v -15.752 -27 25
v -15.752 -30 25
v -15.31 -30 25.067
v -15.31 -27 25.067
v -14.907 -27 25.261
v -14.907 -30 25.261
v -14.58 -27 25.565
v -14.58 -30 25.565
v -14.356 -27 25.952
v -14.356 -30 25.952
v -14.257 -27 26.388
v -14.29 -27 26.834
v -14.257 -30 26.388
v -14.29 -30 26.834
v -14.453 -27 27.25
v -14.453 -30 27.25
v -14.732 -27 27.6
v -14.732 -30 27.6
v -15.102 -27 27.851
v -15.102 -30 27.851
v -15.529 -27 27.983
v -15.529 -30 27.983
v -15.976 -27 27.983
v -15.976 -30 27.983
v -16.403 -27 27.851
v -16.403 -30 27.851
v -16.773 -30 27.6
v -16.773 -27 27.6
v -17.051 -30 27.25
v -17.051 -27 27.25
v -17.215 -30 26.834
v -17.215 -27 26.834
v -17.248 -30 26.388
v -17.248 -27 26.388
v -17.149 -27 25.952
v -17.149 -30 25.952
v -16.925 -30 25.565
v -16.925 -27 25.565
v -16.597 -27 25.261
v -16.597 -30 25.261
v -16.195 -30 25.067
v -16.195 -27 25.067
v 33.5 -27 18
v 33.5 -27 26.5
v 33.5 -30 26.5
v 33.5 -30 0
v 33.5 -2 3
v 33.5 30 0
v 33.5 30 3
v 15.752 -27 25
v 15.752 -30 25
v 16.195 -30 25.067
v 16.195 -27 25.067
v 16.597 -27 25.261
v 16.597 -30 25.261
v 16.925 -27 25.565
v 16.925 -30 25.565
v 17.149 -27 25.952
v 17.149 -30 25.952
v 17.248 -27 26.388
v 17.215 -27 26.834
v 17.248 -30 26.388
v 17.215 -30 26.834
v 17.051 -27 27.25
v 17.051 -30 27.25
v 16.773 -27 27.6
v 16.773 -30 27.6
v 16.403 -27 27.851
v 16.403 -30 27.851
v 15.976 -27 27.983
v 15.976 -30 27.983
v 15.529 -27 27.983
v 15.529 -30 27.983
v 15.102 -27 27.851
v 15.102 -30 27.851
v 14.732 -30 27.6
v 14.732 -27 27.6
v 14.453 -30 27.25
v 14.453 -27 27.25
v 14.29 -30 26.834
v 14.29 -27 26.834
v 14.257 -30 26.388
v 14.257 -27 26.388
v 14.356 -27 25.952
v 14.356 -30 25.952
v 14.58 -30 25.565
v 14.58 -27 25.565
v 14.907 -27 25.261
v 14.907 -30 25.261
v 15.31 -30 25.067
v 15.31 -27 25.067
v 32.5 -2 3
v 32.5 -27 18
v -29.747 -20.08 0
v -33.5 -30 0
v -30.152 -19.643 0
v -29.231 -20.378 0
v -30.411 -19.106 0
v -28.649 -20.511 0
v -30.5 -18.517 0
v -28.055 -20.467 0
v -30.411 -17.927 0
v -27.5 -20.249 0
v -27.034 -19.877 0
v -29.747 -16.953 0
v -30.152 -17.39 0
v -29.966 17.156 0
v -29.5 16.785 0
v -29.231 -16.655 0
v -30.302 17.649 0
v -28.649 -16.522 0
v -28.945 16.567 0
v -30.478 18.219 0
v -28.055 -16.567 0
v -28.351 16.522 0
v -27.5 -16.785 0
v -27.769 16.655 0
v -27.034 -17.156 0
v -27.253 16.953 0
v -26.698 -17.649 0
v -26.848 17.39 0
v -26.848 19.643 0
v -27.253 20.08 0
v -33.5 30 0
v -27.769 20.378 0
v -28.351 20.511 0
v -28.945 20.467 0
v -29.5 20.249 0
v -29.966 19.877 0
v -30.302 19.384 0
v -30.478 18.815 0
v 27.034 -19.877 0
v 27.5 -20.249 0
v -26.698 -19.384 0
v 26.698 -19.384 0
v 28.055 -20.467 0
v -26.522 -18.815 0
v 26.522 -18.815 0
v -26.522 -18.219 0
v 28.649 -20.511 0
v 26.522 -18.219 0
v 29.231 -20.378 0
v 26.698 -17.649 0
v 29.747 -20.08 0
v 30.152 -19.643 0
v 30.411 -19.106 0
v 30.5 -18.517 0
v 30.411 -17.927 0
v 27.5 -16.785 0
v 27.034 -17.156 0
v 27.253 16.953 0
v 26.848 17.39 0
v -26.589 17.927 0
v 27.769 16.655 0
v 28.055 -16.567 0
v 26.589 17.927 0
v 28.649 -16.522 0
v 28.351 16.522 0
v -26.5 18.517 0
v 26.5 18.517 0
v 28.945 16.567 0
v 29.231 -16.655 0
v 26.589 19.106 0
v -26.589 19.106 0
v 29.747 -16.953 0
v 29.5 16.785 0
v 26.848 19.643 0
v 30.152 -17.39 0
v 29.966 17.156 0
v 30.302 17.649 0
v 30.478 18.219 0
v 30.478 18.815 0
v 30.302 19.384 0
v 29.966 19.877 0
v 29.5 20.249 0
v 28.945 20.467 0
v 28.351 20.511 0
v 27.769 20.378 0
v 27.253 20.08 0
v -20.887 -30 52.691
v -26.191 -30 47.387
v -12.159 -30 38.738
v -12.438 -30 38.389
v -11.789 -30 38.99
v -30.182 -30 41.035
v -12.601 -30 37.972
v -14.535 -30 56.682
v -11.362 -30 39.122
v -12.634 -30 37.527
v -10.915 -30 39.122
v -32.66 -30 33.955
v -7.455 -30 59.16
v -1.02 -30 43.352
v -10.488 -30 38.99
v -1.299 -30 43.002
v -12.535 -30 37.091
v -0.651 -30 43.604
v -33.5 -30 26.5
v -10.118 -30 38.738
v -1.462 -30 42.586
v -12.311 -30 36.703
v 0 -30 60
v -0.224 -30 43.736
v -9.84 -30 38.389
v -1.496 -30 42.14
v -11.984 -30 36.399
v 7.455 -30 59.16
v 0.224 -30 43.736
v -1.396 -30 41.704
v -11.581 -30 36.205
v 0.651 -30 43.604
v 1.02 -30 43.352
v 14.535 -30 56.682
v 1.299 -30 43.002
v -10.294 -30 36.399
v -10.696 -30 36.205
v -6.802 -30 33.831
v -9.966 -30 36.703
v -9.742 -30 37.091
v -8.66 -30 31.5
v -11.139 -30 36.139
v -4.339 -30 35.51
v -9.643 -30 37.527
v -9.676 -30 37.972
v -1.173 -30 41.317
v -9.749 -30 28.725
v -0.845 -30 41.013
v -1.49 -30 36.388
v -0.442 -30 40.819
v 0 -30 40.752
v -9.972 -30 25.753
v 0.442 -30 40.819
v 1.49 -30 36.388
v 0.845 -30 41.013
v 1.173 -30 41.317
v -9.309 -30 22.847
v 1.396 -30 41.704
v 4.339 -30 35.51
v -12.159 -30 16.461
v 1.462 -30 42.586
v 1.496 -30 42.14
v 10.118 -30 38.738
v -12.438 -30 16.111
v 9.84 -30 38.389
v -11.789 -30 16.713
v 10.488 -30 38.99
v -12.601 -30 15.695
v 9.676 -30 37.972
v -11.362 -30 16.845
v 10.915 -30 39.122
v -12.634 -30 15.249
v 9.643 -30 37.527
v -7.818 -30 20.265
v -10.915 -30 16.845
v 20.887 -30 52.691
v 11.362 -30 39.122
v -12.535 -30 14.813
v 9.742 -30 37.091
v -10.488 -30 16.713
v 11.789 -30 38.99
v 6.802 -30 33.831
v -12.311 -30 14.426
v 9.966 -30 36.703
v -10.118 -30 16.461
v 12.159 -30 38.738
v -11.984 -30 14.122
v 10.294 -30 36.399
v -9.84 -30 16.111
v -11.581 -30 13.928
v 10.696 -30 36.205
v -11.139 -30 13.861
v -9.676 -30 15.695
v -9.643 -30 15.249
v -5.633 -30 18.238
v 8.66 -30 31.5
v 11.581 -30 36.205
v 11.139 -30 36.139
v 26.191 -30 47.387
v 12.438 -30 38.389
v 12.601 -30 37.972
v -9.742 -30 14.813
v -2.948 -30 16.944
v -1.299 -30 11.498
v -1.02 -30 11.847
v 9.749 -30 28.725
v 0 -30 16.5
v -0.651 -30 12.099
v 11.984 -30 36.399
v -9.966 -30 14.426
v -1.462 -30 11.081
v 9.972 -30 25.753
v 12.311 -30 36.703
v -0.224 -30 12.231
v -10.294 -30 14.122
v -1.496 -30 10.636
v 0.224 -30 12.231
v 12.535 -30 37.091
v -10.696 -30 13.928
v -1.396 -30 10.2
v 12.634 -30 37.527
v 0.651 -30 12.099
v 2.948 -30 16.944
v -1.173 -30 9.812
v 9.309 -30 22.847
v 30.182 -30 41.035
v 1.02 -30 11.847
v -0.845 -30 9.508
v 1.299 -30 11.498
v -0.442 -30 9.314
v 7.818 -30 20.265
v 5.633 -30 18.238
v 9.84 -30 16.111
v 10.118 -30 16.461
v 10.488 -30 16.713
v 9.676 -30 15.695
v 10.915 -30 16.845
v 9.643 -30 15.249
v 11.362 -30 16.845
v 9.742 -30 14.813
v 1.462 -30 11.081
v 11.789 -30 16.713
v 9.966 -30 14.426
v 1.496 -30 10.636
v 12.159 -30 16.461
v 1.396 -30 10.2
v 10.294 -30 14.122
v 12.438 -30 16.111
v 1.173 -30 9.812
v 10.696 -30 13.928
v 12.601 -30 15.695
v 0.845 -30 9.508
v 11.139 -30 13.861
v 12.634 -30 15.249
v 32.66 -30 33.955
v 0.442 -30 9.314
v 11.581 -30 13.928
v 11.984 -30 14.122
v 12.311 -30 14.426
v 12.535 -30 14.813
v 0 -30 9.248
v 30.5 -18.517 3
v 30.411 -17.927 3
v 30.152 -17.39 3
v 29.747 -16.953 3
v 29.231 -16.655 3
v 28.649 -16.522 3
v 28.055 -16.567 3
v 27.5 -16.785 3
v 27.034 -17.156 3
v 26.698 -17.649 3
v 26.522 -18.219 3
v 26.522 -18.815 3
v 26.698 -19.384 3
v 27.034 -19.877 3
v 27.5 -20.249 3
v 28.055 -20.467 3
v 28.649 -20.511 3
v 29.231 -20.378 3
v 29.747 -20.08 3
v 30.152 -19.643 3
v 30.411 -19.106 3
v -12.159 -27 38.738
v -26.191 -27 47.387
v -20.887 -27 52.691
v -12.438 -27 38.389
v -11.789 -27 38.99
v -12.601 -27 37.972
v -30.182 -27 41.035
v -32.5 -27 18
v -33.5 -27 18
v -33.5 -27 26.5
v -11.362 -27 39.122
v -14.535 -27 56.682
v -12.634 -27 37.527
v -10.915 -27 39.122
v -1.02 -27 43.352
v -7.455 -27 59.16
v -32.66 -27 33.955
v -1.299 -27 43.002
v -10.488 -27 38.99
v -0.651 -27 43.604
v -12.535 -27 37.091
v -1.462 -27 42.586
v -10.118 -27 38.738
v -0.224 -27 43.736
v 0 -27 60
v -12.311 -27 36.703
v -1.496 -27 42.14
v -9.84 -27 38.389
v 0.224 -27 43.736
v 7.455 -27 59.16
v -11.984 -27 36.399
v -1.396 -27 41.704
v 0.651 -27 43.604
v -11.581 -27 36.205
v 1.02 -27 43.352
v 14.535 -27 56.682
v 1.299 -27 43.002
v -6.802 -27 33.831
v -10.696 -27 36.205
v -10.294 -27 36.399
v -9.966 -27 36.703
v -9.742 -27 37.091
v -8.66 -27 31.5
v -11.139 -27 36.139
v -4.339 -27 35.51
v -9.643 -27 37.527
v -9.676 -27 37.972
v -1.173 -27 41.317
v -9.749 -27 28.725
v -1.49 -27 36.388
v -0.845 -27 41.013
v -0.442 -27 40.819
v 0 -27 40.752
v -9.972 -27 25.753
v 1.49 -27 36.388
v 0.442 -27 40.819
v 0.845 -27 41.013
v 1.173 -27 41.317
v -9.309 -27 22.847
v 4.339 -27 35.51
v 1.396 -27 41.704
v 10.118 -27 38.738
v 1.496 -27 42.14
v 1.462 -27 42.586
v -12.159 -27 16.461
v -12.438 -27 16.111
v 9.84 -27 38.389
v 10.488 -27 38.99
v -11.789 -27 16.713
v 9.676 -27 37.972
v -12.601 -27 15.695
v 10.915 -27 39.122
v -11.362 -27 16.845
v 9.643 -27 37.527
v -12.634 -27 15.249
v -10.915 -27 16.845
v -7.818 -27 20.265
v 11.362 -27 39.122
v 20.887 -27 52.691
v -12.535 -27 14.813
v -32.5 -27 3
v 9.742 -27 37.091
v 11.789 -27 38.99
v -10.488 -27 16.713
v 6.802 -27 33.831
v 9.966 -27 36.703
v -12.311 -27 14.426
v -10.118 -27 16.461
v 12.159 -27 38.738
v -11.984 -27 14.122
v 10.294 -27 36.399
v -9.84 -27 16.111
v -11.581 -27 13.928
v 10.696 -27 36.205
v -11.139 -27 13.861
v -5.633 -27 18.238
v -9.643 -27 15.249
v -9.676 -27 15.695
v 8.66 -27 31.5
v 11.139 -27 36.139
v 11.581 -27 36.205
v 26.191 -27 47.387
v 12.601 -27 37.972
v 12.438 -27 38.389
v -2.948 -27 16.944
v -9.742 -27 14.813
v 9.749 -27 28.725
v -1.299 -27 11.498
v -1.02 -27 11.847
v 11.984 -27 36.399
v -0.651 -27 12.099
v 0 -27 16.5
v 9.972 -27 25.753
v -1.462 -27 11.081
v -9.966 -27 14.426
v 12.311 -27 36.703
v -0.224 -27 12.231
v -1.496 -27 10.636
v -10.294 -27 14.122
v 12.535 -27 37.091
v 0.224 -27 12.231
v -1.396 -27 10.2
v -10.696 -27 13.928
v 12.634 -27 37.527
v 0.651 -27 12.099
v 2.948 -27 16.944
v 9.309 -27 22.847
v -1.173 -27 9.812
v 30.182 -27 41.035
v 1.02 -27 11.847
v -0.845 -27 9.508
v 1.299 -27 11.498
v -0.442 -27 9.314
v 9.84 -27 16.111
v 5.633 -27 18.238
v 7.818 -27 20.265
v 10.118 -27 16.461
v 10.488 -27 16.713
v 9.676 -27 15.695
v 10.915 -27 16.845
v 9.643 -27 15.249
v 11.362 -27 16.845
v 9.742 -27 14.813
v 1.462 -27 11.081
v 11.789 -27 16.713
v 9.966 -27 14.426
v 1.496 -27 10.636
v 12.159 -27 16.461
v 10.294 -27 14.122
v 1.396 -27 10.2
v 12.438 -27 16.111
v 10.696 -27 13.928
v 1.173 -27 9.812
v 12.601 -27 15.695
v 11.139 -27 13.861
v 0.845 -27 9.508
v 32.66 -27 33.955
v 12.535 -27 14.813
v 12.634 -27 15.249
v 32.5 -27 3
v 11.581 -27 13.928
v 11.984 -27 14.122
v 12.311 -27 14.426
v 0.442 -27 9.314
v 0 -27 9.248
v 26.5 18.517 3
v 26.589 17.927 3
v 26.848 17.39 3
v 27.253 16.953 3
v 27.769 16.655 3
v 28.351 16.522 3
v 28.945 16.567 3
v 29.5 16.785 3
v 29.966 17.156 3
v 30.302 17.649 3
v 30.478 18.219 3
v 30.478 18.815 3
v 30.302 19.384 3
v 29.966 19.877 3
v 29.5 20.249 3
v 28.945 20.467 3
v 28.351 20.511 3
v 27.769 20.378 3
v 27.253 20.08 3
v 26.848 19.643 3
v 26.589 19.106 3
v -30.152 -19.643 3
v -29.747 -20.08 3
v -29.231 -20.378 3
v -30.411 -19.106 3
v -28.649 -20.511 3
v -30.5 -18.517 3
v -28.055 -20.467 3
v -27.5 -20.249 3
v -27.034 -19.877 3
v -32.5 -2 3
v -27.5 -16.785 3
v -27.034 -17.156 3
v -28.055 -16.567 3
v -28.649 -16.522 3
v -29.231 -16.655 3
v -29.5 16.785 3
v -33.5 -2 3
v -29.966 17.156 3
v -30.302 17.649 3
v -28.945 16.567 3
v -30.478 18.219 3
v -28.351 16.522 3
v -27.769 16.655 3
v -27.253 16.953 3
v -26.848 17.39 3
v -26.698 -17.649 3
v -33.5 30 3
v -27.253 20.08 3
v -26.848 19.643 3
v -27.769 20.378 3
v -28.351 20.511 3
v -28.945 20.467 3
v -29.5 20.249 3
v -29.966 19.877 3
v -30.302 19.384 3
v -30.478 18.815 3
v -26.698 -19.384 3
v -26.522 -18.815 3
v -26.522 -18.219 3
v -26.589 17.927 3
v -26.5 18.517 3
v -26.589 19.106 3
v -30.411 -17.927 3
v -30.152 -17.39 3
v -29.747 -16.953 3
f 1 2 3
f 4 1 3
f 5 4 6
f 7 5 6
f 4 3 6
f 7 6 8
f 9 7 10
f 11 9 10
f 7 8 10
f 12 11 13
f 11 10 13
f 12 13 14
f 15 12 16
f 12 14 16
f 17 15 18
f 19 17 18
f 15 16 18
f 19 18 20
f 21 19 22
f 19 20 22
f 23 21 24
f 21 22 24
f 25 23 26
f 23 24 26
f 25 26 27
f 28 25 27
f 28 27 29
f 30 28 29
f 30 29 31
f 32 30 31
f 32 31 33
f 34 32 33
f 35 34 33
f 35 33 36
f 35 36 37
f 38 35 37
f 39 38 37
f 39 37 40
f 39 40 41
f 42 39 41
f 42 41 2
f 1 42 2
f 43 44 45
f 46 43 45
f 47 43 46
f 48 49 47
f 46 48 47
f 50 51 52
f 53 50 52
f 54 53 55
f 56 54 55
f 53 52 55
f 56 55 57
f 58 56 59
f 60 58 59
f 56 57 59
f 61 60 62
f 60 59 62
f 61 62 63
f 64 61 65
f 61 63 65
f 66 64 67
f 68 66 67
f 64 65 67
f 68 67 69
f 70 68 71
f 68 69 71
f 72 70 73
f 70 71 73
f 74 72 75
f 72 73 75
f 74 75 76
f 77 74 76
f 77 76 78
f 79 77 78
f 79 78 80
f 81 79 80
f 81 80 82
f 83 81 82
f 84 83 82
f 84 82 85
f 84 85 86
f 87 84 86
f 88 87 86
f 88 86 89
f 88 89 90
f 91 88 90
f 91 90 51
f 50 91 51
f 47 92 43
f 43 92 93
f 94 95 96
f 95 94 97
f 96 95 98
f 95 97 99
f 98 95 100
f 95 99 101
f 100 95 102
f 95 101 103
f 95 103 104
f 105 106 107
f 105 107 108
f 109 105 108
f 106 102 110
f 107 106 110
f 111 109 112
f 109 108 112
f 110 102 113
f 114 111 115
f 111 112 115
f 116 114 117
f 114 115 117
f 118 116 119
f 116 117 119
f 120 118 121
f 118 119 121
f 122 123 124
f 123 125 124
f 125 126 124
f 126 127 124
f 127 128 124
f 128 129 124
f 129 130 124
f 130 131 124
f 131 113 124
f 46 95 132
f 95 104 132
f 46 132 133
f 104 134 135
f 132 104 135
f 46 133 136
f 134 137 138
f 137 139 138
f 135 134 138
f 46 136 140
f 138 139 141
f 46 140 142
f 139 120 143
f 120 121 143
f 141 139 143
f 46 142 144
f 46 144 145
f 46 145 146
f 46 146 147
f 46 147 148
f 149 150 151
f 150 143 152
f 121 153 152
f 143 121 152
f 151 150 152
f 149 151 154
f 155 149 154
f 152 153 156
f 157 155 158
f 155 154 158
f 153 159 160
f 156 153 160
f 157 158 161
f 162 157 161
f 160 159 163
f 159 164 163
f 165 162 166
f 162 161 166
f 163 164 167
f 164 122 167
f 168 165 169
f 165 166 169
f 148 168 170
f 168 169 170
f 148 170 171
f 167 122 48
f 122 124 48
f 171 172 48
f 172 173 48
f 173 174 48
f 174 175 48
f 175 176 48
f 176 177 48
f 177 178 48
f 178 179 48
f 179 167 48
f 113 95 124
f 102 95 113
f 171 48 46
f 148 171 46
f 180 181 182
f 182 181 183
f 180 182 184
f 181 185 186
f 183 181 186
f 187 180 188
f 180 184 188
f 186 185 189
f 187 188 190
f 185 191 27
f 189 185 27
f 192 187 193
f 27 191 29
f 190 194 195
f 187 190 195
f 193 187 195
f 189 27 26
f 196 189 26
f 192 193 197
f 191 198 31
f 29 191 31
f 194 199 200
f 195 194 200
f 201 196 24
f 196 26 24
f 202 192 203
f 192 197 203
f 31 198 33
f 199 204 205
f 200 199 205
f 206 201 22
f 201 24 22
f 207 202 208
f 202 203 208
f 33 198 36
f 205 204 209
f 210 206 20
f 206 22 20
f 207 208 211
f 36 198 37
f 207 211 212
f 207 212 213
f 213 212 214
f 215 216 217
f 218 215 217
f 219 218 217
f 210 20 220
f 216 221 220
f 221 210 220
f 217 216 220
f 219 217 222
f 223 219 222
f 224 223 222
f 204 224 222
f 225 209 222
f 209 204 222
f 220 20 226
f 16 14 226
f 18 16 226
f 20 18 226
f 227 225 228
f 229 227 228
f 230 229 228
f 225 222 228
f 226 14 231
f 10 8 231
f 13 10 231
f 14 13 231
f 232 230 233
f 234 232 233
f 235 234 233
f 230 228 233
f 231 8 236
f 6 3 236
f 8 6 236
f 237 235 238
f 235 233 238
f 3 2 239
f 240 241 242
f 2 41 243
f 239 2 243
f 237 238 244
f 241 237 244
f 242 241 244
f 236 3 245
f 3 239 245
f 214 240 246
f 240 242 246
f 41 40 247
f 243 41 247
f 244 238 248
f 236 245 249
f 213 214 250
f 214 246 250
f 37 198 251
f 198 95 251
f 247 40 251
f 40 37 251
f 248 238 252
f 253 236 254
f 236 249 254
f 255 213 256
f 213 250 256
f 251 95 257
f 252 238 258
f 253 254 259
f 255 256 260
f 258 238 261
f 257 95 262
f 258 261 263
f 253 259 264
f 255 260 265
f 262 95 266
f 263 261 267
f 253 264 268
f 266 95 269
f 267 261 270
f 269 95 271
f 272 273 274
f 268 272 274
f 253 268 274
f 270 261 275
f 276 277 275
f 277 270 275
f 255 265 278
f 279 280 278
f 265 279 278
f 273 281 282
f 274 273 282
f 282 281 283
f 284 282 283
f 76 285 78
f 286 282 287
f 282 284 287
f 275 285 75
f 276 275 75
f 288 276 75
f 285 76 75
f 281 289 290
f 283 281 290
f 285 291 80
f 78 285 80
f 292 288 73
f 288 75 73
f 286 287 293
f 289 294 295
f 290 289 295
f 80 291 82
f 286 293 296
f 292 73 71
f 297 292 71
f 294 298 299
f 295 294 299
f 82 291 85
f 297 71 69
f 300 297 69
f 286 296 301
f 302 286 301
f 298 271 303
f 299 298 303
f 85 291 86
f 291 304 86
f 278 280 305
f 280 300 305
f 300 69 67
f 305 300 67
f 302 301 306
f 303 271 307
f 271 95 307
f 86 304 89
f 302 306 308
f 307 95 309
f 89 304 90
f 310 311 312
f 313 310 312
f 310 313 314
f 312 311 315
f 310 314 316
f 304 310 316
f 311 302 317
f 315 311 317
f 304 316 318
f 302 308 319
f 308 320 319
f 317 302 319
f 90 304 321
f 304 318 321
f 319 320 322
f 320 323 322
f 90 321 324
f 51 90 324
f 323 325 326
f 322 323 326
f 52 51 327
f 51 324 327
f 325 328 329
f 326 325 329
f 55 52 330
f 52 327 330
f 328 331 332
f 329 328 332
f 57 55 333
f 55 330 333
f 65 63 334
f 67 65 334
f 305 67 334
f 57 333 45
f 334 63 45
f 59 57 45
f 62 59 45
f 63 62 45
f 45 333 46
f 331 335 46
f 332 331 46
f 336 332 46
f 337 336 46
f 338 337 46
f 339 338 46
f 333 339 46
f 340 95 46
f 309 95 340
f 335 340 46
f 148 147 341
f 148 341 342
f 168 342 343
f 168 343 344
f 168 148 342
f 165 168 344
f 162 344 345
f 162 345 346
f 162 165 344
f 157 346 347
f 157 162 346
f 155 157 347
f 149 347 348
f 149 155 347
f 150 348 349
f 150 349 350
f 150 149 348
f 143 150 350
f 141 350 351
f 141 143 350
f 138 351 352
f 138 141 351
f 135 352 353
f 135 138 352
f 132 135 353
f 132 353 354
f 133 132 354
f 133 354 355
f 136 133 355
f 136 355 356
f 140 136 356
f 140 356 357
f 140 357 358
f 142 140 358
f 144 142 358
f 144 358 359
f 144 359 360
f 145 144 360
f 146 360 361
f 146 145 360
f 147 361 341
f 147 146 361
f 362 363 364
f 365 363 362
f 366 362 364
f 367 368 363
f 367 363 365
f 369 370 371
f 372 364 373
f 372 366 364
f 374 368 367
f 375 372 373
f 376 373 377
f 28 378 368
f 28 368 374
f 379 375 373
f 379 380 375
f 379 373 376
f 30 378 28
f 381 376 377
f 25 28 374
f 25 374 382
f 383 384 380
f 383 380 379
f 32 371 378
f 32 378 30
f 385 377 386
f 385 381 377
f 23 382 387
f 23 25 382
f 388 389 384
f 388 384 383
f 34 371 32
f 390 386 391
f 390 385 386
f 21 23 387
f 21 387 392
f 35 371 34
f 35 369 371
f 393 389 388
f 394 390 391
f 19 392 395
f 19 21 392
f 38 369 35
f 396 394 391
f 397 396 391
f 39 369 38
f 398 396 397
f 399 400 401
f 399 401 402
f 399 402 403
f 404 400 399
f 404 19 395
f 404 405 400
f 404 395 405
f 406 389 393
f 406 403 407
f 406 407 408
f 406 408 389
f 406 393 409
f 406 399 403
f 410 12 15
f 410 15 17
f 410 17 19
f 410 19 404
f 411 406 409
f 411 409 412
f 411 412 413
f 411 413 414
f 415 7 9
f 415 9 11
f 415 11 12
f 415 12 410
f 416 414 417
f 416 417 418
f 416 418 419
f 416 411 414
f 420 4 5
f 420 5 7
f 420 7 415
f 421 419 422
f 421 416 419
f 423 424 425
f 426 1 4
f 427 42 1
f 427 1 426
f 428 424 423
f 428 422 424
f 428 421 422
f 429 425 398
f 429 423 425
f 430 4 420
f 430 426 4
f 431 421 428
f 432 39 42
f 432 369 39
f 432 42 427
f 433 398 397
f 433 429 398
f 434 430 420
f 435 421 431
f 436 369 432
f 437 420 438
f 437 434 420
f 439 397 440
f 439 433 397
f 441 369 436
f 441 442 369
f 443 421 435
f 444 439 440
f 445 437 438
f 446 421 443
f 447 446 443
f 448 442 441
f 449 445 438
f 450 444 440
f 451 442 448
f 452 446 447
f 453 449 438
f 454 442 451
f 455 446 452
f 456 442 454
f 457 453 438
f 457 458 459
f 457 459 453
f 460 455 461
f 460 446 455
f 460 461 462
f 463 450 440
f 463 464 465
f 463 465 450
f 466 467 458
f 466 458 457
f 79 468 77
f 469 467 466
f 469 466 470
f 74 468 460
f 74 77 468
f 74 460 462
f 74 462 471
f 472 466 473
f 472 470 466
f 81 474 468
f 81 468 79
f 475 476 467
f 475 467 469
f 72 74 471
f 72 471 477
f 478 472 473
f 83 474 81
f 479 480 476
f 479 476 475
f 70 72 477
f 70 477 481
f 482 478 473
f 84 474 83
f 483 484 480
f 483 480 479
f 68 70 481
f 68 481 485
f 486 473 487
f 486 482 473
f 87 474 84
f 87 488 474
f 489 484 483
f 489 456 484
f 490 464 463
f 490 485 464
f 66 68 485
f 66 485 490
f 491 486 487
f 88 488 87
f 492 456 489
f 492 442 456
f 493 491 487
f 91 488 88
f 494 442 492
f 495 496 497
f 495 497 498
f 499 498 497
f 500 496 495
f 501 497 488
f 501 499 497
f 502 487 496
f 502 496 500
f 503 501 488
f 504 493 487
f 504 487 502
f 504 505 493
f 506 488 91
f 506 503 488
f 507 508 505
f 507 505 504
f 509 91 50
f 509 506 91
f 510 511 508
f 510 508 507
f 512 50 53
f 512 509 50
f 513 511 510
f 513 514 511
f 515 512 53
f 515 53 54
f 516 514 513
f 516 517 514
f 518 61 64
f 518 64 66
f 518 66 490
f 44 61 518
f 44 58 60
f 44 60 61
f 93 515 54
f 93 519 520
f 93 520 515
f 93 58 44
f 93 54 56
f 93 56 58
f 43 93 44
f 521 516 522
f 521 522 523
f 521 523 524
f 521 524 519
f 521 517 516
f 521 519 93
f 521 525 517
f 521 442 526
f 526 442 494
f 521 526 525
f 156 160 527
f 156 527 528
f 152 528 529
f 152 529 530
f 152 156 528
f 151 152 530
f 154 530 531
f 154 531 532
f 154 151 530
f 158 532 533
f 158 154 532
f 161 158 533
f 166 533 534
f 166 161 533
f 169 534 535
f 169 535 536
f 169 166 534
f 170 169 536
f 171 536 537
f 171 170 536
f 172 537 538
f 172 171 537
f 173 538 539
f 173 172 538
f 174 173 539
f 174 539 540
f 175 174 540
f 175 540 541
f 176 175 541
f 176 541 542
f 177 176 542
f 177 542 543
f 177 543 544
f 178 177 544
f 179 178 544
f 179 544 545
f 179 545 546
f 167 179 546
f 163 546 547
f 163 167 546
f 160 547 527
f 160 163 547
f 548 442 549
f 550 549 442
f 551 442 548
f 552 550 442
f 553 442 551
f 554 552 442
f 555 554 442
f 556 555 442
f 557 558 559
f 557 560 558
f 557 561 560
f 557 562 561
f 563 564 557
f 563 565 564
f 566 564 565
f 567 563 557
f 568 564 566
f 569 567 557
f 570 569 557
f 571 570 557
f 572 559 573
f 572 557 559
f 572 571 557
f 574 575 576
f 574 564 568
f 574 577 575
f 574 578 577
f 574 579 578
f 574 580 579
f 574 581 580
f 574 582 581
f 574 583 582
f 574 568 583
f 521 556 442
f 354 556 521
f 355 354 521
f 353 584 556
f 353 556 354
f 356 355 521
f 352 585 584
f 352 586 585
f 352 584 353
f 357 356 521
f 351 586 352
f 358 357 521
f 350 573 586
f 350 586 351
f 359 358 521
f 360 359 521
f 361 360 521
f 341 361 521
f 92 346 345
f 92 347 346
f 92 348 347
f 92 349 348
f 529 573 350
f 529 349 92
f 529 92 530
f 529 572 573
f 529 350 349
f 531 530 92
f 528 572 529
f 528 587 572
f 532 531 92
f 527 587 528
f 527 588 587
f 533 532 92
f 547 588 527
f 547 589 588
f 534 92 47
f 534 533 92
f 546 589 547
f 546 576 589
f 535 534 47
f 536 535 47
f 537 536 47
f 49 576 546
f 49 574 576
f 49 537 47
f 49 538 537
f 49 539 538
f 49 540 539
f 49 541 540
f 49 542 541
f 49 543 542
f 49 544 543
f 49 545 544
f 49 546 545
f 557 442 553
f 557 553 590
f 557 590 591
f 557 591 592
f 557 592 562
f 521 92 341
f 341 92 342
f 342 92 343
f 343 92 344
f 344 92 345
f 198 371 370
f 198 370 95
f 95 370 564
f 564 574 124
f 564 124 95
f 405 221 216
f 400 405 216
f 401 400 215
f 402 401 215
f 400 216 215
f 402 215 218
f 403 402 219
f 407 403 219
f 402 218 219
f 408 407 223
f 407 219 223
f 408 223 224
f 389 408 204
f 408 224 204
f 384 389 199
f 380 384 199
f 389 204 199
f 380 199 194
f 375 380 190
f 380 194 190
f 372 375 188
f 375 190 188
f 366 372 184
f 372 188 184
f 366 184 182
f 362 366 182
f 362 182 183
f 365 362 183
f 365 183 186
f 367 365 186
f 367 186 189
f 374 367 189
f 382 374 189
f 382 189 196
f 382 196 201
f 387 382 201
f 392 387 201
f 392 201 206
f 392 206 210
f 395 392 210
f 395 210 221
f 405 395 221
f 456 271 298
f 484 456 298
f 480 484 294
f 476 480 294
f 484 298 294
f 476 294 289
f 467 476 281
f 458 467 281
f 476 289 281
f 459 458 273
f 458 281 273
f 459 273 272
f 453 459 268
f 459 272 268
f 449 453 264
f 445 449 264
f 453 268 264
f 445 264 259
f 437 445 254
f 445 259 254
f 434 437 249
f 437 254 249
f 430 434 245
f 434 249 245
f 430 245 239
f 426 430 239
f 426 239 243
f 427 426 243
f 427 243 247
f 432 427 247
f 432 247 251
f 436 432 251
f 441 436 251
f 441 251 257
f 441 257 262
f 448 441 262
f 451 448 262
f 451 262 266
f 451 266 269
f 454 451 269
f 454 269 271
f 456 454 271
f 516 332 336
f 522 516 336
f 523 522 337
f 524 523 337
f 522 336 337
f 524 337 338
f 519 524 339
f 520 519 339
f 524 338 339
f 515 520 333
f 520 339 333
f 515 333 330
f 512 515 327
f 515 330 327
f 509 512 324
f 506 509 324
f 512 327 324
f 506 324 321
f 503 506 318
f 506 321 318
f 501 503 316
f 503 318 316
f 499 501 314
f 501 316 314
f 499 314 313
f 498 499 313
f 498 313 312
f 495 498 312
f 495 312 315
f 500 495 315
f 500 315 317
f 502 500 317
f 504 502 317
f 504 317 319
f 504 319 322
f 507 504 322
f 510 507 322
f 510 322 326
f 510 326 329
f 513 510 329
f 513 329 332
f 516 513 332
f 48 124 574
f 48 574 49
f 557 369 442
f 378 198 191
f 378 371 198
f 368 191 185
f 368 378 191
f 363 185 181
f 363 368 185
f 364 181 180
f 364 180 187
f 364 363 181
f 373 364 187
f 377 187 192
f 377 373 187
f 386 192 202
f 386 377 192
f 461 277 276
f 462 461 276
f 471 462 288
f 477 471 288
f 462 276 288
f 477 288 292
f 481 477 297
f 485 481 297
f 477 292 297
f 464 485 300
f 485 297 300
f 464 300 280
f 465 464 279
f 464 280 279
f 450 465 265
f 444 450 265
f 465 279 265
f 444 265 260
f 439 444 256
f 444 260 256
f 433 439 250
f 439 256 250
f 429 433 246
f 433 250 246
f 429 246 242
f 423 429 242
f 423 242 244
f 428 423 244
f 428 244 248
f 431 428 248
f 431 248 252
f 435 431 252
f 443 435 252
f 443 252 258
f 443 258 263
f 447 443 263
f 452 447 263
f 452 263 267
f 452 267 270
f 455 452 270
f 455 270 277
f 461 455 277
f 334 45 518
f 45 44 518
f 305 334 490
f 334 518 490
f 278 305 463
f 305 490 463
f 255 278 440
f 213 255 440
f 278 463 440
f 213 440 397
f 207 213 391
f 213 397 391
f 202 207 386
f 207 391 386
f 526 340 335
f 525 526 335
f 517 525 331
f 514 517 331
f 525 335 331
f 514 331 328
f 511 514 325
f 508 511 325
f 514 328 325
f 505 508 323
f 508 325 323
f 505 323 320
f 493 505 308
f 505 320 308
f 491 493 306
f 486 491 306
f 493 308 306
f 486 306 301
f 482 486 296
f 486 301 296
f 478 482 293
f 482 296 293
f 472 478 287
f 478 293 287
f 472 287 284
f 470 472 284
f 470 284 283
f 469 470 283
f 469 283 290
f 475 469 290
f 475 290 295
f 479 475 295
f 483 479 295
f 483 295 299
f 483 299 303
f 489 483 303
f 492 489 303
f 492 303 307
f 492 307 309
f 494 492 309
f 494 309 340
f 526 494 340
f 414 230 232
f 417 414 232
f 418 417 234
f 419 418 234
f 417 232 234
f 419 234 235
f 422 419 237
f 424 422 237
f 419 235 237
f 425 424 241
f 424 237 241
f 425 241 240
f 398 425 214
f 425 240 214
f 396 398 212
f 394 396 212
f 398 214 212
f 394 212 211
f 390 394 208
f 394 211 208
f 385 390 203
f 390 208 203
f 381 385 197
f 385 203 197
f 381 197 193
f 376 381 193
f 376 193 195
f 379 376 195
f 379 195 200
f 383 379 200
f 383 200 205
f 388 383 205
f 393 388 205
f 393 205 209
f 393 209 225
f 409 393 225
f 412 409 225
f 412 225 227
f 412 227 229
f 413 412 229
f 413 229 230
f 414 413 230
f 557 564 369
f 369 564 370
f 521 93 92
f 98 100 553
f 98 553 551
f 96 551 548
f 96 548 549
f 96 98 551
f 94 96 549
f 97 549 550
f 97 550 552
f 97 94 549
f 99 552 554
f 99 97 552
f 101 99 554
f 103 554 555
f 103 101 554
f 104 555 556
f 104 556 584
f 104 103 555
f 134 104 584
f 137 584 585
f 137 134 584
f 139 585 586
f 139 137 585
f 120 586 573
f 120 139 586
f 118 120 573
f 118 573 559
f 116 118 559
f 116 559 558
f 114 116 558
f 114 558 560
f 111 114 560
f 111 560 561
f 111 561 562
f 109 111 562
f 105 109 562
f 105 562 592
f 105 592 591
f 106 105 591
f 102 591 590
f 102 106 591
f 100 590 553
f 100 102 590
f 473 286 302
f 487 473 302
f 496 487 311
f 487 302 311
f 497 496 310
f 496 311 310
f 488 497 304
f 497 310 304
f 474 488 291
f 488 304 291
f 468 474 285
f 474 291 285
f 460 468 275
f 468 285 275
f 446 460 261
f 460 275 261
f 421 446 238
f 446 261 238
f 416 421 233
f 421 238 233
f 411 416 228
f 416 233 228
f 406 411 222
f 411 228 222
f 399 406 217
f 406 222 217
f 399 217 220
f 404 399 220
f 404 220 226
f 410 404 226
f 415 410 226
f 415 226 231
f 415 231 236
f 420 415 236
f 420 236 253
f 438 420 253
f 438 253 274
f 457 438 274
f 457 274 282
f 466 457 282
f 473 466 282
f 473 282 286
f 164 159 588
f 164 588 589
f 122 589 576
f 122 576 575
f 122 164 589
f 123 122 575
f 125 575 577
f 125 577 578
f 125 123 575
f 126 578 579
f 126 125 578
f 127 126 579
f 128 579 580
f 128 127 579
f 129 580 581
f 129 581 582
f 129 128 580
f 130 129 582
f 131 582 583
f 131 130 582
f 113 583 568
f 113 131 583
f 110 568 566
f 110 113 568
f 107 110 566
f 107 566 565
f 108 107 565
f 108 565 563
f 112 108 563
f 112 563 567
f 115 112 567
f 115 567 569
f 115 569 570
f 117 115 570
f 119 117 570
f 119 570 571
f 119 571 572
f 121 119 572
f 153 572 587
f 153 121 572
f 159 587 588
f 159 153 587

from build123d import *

# Parameters (mm, degrees)
SKETCH1_W           = 67
SKETCH1_H           = 60
SKETCH1_R           = 2
BOSS_EXTRUDE1_DEPTH = 3
SKETCH2_W           = 67
SKETCH2_H           = 3
BOSS_EXTRUDE2_DEPTH = 57
FILLET1_R           = 33.5
SKETCH3_R           = 10
SKETCH3_R_2         = 1.5
CUT_EXTRUDE1_DEPTH  = 57
BOSS_EXTRUDE3_DEPTH = 1
BOSS_EXTRUDE4_START = -66
BOSS_EXTRUDE4_DEPTH = 1


with BuildPart() as part:
    # Sketch1 → Boss-Extrude1 (new body)
    with BuildSketch(Plane.XY):
        Rectangle(SKETCH1_W, SKETCH1_H)
        with Locations((-28.5, 18.516649199)):
            Circle(SKETCH1_R, mode=Mode.SUBTRACT)
        with Locations(Location((28.5, 18.516649199, 0), (0, 0, 180))):
            Circle(SKETCH1_R, mode=Mode.SUBTRACT)
        with Locations((28.5, -18.516649199)):
            Circle(SKETCH1_R, mode=Mode.SUBTRACT)
        with Locations(Location((-28.5, -18.516649199, 0), (0, 0, 180))):
            Circle(SKETCH1_R, mode=Mode.SUBTRACT)
    extrude(amount=BOSS_EXTRUDE1_DEPTH)

    # Sketch2 → Boss-Extrude2 (add)
    with BuildSketch(Plane.XY.offset(3)):
        with Locations((0, -28.5)):
            Rectangle(SKETCH2_W, SKETCH2_H)
    extrude(amount=BOSS_EXTRUDE2_DEPTH)

    # Fillet1
    fillet1_edges = [part.edges().sort_by_distance(p)[0] for p in [
        (-33.5, -28.5, 60),
        (33.5, -28.5, 60),
    ]]
    fillet(fillet1_edges, radius=FILLET1_R - 0.0001)  # a hair under: the kernel refuses the full size

    # Sketch3 → Cut-Extrude1 (cut)
    with BuildSketch(Plane.XZ.offset(30)):
        with Locations(Location((0, 26.5, 0), (0, 0, 270))):
            Circle(SKETCH3_R)
        with Locations(Location((0, 42.252397405, 0), (0, 0, 270))):
            Circle(SKETCH3_R_2)
        with Locations(Location((11.138627025, 37.638627025, 0), (0, 0, 270))):
            Circle(SKETCH3_R_2)
        with Locations(Location((15.752397405, 26.5, 0), (0, 0, 270))):
            Circle(SKETCH3_R_2)
        with Locations(Location((11.138627025, 15.361372975, 0), (0, 0, 270))):
            Circle(SKETCH3_R_2)
        with Locations(Location((0, 10.747602595, 0), (0, 0, 270))):
            Circle(SKETCH3_R_2)
        with Locations(Location((-11.138627025, 15.361372975, 0), (0, 0, 270))):
            Circle(SKETCH3_R_2)
        with Locations(Location((-15.752397405, 26.5, 0), (0, 0, 270))):
            Circle(SKETCH3_R_2)
        with Locations(Location((-11.138627025, 37.638627025, 0), (0, 0, 270))):
            Circle(SKETCH3_R_2)
    extrude(amount=-CUT_EXTRUDE1_DEPTH, mode=Mode.SUBTRACT)

    # Sketch4 → Boss-Extrude3 (add)
    with BuildSketch(Plane.ZY.offset(33.5)):
        Polygon((3, -2), (18, -27), (3, -27), align=None)
    extrude(amount=-BOSS_EXTRUDE3_DEPTH)

    # Sketch4<2> → Boss-Extrude4 (add)
    with BuildSketch(Plane.ZY.offset(33.5).offset(BOSS_EXTRUDE4_START)):
        Polygon((3, -2), (18, -27), (3, -27), align=None)
    extrude(amount=-BOSS_EXTRUDE4_DEPTH)


solid = part.part
